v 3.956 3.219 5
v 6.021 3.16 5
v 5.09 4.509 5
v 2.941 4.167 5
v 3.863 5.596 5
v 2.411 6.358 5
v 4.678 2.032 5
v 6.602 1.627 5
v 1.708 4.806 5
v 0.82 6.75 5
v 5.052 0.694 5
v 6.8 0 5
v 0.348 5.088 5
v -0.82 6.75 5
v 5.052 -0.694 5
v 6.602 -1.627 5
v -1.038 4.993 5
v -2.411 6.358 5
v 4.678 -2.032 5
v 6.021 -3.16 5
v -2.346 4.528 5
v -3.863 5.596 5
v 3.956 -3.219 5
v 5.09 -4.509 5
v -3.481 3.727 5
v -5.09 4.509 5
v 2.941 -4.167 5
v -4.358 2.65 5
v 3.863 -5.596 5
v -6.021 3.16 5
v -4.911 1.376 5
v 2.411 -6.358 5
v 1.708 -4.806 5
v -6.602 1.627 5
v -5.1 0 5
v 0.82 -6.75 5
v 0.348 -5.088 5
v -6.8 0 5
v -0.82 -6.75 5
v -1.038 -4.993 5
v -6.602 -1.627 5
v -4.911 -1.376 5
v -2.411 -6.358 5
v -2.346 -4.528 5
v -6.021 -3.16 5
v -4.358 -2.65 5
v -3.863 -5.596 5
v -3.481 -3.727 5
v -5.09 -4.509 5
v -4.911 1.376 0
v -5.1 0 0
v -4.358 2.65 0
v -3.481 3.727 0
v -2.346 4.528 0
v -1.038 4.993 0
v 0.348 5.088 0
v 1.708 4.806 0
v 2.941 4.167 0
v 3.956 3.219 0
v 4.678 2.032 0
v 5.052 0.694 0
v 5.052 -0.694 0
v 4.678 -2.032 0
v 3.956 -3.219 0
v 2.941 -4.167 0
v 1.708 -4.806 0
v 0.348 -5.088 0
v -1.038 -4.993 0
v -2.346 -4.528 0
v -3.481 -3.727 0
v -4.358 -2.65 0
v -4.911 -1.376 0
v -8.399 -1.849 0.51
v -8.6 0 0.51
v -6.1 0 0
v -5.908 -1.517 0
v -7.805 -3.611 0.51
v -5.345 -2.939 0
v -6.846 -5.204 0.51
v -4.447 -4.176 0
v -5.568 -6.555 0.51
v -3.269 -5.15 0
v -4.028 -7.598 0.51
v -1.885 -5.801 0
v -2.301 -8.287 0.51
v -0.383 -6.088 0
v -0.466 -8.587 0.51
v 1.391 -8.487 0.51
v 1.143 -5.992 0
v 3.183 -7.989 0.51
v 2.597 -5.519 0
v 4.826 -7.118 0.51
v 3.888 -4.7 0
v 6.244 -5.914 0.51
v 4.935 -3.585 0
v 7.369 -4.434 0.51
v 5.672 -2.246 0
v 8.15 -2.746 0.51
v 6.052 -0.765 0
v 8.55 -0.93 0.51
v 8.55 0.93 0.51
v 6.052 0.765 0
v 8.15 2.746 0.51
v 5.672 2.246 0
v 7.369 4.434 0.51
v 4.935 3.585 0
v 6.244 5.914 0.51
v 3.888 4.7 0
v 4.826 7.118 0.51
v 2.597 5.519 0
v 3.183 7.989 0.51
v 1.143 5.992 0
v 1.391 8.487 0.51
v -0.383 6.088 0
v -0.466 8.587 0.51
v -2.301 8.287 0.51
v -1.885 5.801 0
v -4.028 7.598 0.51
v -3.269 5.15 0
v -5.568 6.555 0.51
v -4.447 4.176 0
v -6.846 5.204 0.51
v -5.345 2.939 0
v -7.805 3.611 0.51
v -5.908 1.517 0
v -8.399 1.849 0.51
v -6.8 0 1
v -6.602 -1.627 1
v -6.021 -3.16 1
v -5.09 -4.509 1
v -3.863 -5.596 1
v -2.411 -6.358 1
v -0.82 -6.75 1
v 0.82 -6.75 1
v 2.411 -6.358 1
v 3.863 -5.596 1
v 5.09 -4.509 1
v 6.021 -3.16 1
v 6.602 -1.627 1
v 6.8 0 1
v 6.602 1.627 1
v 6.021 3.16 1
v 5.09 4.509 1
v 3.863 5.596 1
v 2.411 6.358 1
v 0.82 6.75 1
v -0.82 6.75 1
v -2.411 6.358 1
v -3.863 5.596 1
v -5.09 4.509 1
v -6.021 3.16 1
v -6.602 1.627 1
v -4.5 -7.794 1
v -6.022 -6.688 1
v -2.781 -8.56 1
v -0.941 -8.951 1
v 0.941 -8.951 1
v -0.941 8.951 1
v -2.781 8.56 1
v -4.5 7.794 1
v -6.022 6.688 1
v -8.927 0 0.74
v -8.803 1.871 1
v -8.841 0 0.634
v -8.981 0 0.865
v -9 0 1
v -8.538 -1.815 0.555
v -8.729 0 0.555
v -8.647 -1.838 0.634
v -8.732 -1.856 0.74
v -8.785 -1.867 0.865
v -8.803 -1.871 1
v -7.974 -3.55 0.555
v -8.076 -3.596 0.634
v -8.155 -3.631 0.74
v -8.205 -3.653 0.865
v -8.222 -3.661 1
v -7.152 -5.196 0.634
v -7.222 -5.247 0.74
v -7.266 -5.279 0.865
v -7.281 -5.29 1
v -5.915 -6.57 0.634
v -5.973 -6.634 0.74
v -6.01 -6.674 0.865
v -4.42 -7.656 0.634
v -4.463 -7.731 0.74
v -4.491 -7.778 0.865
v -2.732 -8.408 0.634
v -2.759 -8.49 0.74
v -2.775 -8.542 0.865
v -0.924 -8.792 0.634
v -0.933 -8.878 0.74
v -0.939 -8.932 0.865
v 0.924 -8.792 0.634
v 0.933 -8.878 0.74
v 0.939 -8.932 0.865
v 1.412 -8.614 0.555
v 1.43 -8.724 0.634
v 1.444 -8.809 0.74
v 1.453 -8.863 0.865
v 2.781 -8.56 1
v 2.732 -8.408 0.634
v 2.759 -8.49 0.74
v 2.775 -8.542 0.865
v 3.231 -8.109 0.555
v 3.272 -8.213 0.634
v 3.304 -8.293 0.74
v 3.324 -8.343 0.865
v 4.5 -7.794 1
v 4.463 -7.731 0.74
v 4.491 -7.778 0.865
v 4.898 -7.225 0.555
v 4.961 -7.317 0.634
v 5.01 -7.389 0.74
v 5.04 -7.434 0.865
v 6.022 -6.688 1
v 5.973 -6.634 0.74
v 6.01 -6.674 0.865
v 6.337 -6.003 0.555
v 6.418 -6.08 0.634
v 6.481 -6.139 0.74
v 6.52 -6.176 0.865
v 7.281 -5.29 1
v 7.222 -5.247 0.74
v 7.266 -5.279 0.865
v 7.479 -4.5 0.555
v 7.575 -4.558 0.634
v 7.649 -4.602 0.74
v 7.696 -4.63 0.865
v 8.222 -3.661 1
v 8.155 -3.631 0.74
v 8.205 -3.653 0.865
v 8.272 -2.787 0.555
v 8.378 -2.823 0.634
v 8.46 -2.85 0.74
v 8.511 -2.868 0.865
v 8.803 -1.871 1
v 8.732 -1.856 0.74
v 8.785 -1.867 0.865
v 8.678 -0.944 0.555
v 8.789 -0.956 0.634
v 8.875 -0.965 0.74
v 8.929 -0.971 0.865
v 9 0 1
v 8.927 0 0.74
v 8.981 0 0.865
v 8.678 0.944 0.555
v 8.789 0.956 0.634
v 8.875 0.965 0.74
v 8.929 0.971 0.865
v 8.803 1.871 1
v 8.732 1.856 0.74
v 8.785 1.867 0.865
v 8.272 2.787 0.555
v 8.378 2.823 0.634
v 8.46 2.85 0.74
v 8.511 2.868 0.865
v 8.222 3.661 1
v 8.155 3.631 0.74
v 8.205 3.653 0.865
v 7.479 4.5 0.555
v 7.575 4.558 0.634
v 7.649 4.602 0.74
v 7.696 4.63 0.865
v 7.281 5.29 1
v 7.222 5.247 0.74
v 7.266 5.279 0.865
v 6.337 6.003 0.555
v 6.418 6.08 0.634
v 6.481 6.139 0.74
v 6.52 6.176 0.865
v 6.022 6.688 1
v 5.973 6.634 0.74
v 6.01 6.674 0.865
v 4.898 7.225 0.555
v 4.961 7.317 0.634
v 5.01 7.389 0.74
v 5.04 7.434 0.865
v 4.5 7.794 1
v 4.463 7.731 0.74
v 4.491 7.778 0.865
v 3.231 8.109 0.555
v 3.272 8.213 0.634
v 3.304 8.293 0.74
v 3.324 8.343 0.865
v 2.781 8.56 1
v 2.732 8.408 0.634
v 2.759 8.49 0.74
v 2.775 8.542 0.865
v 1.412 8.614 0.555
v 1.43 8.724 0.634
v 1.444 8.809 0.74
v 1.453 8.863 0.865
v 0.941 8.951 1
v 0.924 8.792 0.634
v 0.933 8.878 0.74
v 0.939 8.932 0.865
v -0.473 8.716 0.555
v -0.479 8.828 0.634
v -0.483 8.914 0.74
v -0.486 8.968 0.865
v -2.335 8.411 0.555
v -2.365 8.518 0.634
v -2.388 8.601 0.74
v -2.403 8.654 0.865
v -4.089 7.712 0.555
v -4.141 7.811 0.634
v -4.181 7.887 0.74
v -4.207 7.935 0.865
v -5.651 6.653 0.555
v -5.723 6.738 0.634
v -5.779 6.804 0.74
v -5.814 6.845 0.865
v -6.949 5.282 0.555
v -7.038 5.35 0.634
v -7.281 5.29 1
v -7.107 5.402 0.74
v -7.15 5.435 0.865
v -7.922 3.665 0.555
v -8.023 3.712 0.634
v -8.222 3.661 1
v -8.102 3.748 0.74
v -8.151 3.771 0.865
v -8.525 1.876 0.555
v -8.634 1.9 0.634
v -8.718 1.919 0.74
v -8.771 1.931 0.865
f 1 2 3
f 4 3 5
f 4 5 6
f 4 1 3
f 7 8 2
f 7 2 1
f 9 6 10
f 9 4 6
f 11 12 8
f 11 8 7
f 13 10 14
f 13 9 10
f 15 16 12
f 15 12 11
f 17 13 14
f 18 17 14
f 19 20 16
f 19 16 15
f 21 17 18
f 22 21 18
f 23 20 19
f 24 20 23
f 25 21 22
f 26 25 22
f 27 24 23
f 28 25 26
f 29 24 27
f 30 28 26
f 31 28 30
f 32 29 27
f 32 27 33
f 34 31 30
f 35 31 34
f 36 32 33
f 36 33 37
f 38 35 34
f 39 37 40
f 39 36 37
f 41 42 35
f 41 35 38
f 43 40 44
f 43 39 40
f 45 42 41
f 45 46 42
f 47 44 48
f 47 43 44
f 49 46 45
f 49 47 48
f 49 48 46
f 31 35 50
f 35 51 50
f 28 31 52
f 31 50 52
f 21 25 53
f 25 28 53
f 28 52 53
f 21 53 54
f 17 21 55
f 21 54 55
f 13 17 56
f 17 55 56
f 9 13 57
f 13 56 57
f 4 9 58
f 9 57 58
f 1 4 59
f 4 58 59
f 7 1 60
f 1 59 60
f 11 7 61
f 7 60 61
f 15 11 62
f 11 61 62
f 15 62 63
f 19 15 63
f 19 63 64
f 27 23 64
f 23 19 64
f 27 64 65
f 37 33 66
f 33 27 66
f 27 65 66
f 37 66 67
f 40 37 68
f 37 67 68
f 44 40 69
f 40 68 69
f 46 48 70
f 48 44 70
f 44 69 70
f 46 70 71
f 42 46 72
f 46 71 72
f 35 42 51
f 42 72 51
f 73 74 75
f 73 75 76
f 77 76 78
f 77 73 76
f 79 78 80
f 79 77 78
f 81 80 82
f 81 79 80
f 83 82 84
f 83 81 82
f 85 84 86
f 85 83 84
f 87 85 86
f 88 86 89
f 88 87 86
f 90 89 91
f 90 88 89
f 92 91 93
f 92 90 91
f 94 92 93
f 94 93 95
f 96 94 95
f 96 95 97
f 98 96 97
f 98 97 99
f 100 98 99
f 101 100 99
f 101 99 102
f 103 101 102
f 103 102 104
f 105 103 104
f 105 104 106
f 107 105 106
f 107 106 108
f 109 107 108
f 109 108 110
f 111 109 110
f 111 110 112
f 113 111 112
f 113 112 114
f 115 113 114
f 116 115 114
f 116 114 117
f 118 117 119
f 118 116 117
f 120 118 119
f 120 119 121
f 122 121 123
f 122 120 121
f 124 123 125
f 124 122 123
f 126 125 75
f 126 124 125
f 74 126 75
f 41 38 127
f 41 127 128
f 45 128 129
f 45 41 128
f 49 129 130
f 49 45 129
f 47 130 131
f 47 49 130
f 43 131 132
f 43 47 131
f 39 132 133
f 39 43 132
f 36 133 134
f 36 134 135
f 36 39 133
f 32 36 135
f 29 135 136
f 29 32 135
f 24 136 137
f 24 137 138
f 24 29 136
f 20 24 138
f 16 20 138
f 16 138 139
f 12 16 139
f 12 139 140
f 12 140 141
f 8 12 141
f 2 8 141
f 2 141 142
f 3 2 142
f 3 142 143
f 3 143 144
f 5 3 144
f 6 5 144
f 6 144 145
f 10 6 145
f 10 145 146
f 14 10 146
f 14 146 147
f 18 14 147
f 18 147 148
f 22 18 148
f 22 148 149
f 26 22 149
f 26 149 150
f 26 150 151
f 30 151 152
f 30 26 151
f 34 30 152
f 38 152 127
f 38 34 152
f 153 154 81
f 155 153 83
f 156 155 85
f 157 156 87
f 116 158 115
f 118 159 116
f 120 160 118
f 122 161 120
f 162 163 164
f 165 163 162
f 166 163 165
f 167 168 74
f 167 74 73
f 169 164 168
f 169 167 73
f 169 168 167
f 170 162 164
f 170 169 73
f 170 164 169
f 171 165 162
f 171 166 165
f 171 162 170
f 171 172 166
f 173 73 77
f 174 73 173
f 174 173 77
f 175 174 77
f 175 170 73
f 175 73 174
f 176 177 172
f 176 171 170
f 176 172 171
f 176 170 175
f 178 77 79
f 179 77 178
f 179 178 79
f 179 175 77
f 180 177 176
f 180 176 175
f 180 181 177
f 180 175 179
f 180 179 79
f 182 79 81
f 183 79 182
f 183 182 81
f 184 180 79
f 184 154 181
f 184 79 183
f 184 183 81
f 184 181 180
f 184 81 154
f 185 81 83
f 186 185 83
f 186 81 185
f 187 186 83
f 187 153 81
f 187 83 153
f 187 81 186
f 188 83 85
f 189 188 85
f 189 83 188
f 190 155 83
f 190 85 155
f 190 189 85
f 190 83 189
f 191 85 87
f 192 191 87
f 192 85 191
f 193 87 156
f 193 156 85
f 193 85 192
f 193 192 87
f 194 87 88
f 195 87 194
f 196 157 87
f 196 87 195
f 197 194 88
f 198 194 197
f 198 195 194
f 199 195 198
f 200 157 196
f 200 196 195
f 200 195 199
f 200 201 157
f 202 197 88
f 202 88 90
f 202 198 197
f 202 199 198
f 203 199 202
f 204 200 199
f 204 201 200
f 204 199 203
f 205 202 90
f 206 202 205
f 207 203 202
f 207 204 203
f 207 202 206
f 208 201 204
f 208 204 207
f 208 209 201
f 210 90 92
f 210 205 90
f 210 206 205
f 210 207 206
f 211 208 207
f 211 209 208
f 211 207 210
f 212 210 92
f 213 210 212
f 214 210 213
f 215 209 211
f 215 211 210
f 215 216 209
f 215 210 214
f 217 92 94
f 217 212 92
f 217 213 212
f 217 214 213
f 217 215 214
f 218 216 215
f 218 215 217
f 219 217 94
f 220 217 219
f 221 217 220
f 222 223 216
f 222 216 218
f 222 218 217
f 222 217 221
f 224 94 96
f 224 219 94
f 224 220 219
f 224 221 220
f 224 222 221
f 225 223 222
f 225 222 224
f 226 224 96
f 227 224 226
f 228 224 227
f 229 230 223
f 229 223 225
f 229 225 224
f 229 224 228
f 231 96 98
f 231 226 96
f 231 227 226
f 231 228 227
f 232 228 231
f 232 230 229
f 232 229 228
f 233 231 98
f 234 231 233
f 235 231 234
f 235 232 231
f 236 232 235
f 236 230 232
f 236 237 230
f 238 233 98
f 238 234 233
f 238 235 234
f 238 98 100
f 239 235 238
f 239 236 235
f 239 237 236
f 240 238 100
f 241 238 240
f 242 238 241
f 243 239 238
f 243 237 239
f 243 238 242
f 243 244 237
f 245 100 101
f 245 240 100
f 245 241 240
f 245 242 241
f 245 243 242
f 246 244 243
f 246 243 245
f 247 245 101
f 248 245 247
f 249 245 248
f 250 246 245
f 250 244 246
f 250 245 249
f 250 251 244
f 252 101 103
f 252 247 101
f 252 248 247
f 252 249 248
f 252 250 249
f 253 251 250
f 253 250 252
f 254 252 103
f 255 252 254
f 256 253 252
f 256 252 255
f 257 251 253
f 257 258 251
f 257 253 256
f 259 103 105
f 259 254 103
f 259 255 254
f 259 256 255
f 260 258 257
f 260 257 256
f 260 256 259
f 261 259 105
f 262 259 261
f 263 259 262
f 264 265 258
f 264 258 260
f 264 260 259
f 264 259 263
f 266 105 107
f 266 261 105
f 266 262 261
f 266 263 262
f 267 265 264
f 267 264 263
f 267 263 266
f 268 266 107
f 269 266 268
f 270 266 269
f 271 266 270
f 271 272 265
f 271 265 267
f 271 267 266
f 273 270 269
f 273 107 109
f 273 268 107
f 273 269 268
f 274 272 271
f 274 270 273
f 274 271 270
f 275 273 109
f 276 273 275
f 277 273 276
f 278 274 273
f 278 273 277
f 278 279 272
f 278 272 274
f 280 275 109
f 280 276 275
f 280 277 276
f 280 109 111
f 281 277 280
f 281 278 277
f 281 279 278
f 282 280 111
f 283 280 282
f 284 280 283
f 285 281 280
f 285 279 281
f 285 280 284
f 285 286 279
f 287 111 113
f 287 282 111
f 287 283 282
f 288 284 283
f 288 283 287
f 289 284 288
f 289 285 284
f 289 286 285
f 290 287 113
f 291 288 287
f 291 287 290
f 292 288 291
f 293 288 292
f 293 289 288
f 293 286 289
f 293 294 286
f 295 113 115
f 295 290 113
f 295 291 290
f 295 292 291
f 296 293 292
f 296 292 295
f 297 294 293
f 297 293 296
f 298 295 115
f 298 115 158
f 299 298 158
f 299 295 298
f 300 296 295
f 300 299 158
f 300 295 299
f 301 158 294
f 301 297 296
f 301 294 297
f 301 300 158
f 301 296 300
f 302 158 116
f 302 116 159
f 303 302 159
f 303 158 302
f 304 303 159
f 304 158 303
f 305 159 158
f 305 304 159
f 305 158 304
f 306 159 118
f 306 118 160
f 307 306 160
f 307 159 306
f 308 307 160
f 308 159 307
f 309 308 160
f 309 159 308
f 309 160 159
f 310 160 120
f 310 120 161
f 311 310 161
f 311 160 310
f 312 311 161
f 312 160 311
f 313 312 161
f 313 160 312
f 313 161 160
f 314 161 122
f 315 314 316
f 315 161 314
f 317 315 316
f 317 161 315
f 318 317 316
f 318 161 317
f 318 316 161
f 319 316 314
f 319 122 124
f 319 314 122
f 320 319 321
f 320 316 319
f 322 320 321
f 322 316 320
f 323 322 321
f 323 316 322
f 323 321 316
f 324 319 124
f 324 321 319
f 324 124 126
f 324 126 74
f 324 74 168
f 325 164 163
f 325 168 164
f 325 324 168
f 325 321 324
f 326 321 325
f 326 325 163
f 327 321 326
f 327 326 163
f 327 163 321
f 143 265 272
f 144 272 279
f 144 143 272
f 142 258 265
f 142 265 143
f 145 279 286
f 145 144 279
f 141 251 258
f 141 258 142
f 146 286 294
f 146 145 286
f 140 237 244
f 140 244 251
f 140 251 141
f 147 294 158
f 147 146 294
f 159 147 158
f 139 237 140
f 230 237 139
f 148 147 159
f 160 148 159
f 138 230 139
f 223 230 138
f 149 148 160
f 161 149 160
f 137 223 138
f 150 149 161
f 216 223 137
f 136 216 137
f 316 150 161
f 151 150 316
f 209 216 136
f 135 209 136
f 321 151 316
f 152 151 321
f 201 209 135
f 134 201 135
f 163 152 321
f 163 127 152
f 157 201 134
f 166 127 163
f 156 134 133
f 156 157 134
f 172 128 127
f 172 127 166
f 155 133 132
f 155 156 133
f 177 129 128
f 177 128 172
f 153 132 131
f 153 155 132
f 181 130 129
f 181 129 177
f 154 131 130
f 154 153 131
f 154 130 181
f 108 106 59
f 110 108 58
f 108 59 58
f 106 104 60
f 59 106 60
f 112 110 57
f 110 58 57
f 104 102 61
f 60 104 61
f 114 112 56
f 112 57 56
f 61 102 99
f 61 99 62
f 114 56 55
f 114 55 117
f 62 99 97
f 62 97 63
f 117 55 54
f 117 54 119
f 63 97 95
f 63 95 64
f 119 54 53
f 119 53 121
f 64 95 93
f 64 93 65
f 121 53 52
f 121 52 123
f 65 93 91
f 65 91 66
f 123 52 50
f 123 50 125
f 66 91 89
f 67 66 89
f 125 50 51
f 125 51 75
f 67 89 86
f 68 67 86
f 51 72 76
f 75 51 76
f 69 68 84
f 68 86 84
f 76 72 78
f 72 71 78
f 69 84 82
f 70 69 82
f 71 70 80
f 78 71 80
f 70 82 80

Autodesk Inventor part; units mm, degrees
ref_plane "YZ Plane" through (0, 0, 0) normal (1, 0, 0) x (0, 1, 0)
ref_plane "XZ Plane" through (0, 0, 0) normal (0, 1, 0) x (-1, 0, 0)
ref_plane "XY Plane" through (0, 0, 0) normal (0, 0, 1) x (1, 0, 0)
sketch "Skizze1" plane through (0, 0, 0) normal (0, 1, 0) x (-1, 0, 0)
  line L0 (6.1, 0) -> (8.6, 0.5101)
  arc A0 (8.6, 0.5101) -> (9, 1) centre (8.5, 1) ccw
  line L1 (9, 1) -> (6.8, 1)
  line L2 (6.8, 1) -> (6.8, 5)
  line L3 (6.8, 5) -> (5.1, 5)
  line L4 (5.1, 5) -> (5.1, 0)
  line L5 (5.1, 0) -> (6.1, 0)
  line L6 (0, 0) -> (0, 11) construction
  dimension "d0" = 6.8
  dimension "d1" = 5.1
  dimension "d2" = 1
  dimension "d3" = 9
  dimension "d4" = 1
  dimension "d6" = 4
  dimension "d8" = 0.5
revolve "Umdrehung1" add sketch "Skizze1" angle 360 about axis through (0, 0, 0) along (0, 0, 1)
properties part number "08-02-01-010_buttonSide" material "ABS-Kunststoff(1)"
